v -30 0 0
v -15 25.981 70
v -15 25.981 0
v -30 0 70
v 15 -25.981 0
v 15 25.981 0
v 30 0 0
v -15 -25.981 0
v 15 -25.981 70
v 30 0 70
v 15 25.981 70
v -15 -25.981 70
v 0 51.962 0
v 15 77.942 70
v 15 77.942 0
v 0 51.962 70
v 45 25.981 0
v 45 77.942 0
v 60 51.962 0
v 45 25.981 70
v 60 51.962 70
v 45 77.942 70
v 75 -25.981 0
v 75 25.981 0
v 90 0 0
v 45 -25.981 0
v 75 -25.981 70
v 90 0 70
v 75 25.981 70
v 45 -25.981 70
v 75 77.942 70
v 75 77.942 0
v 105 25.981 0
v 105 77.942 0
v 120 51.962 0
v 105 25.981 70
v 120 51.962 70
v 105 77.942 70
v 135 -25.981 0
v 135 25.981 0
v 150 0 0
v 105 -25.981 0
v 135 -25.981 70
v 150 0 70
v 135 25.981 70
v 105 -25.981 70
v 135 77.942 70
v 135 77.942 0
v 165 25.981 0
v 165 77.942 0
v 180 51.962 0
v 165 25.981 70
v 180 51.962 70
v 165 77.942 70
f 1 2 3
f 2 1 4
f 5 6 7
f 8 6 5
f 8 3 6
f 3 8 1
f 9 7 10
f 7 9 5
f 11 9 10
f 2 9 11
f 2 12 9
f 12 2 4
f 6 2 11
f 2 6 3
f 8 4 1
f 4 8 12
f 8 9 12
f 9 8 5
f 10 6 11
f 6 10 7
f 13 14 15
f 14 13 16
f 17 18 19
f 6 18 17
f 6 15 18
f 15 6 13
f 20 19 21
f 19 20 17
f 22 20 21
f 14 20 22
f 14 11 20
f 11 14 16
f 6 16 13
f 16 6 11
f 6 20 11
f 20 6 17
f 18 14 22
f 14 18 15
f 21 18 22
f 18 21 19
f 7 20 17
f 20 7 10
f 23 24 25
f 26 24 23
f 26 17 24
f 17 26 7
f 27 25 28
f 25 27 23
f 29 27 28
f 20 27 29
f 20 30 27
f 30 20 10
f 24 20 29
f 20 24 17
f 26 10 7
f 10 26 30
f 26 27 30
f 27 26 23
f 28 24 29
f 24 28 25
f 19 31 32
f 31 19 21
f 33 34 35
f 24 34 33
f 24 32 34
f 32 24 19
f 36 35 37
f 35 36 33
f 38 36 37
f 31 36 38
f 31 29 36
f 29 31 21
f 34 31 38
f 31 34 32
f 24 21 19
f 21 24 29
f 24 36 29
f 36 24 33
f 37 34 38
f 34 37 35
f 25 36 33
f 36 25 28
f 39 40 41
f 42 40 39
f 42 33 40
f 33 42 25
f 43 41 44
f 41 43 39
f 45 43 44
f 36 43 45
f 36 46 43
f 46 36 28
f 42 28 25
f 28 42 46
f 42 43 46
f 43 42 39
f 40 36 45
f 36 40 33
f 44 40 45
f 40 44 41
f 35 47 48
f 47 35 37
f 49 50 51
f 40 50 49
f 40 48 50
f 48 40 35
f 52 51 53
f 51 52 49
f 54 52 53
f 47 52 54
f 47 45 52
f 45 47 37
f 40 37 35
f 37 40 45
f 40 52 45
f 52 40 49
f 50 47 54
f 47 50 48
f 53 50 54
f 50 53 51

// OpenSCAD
module hex_prism(height, radius) {
    points = [ for (i = [0:5]) let(a = 360 * i / 6) [radius * cos(a), radius * sin(a)] ];
    linear_extrude(height) polygon(points);
}

for (i = [0:2]) {
    for (j = [0:1]) {
        x = i * 2 * 30 + (j % 2) * 30;
        y = j * sqrt(3) * 30;
        translate([x, y, 0]) hex_prism(70, 30);
    }
}
